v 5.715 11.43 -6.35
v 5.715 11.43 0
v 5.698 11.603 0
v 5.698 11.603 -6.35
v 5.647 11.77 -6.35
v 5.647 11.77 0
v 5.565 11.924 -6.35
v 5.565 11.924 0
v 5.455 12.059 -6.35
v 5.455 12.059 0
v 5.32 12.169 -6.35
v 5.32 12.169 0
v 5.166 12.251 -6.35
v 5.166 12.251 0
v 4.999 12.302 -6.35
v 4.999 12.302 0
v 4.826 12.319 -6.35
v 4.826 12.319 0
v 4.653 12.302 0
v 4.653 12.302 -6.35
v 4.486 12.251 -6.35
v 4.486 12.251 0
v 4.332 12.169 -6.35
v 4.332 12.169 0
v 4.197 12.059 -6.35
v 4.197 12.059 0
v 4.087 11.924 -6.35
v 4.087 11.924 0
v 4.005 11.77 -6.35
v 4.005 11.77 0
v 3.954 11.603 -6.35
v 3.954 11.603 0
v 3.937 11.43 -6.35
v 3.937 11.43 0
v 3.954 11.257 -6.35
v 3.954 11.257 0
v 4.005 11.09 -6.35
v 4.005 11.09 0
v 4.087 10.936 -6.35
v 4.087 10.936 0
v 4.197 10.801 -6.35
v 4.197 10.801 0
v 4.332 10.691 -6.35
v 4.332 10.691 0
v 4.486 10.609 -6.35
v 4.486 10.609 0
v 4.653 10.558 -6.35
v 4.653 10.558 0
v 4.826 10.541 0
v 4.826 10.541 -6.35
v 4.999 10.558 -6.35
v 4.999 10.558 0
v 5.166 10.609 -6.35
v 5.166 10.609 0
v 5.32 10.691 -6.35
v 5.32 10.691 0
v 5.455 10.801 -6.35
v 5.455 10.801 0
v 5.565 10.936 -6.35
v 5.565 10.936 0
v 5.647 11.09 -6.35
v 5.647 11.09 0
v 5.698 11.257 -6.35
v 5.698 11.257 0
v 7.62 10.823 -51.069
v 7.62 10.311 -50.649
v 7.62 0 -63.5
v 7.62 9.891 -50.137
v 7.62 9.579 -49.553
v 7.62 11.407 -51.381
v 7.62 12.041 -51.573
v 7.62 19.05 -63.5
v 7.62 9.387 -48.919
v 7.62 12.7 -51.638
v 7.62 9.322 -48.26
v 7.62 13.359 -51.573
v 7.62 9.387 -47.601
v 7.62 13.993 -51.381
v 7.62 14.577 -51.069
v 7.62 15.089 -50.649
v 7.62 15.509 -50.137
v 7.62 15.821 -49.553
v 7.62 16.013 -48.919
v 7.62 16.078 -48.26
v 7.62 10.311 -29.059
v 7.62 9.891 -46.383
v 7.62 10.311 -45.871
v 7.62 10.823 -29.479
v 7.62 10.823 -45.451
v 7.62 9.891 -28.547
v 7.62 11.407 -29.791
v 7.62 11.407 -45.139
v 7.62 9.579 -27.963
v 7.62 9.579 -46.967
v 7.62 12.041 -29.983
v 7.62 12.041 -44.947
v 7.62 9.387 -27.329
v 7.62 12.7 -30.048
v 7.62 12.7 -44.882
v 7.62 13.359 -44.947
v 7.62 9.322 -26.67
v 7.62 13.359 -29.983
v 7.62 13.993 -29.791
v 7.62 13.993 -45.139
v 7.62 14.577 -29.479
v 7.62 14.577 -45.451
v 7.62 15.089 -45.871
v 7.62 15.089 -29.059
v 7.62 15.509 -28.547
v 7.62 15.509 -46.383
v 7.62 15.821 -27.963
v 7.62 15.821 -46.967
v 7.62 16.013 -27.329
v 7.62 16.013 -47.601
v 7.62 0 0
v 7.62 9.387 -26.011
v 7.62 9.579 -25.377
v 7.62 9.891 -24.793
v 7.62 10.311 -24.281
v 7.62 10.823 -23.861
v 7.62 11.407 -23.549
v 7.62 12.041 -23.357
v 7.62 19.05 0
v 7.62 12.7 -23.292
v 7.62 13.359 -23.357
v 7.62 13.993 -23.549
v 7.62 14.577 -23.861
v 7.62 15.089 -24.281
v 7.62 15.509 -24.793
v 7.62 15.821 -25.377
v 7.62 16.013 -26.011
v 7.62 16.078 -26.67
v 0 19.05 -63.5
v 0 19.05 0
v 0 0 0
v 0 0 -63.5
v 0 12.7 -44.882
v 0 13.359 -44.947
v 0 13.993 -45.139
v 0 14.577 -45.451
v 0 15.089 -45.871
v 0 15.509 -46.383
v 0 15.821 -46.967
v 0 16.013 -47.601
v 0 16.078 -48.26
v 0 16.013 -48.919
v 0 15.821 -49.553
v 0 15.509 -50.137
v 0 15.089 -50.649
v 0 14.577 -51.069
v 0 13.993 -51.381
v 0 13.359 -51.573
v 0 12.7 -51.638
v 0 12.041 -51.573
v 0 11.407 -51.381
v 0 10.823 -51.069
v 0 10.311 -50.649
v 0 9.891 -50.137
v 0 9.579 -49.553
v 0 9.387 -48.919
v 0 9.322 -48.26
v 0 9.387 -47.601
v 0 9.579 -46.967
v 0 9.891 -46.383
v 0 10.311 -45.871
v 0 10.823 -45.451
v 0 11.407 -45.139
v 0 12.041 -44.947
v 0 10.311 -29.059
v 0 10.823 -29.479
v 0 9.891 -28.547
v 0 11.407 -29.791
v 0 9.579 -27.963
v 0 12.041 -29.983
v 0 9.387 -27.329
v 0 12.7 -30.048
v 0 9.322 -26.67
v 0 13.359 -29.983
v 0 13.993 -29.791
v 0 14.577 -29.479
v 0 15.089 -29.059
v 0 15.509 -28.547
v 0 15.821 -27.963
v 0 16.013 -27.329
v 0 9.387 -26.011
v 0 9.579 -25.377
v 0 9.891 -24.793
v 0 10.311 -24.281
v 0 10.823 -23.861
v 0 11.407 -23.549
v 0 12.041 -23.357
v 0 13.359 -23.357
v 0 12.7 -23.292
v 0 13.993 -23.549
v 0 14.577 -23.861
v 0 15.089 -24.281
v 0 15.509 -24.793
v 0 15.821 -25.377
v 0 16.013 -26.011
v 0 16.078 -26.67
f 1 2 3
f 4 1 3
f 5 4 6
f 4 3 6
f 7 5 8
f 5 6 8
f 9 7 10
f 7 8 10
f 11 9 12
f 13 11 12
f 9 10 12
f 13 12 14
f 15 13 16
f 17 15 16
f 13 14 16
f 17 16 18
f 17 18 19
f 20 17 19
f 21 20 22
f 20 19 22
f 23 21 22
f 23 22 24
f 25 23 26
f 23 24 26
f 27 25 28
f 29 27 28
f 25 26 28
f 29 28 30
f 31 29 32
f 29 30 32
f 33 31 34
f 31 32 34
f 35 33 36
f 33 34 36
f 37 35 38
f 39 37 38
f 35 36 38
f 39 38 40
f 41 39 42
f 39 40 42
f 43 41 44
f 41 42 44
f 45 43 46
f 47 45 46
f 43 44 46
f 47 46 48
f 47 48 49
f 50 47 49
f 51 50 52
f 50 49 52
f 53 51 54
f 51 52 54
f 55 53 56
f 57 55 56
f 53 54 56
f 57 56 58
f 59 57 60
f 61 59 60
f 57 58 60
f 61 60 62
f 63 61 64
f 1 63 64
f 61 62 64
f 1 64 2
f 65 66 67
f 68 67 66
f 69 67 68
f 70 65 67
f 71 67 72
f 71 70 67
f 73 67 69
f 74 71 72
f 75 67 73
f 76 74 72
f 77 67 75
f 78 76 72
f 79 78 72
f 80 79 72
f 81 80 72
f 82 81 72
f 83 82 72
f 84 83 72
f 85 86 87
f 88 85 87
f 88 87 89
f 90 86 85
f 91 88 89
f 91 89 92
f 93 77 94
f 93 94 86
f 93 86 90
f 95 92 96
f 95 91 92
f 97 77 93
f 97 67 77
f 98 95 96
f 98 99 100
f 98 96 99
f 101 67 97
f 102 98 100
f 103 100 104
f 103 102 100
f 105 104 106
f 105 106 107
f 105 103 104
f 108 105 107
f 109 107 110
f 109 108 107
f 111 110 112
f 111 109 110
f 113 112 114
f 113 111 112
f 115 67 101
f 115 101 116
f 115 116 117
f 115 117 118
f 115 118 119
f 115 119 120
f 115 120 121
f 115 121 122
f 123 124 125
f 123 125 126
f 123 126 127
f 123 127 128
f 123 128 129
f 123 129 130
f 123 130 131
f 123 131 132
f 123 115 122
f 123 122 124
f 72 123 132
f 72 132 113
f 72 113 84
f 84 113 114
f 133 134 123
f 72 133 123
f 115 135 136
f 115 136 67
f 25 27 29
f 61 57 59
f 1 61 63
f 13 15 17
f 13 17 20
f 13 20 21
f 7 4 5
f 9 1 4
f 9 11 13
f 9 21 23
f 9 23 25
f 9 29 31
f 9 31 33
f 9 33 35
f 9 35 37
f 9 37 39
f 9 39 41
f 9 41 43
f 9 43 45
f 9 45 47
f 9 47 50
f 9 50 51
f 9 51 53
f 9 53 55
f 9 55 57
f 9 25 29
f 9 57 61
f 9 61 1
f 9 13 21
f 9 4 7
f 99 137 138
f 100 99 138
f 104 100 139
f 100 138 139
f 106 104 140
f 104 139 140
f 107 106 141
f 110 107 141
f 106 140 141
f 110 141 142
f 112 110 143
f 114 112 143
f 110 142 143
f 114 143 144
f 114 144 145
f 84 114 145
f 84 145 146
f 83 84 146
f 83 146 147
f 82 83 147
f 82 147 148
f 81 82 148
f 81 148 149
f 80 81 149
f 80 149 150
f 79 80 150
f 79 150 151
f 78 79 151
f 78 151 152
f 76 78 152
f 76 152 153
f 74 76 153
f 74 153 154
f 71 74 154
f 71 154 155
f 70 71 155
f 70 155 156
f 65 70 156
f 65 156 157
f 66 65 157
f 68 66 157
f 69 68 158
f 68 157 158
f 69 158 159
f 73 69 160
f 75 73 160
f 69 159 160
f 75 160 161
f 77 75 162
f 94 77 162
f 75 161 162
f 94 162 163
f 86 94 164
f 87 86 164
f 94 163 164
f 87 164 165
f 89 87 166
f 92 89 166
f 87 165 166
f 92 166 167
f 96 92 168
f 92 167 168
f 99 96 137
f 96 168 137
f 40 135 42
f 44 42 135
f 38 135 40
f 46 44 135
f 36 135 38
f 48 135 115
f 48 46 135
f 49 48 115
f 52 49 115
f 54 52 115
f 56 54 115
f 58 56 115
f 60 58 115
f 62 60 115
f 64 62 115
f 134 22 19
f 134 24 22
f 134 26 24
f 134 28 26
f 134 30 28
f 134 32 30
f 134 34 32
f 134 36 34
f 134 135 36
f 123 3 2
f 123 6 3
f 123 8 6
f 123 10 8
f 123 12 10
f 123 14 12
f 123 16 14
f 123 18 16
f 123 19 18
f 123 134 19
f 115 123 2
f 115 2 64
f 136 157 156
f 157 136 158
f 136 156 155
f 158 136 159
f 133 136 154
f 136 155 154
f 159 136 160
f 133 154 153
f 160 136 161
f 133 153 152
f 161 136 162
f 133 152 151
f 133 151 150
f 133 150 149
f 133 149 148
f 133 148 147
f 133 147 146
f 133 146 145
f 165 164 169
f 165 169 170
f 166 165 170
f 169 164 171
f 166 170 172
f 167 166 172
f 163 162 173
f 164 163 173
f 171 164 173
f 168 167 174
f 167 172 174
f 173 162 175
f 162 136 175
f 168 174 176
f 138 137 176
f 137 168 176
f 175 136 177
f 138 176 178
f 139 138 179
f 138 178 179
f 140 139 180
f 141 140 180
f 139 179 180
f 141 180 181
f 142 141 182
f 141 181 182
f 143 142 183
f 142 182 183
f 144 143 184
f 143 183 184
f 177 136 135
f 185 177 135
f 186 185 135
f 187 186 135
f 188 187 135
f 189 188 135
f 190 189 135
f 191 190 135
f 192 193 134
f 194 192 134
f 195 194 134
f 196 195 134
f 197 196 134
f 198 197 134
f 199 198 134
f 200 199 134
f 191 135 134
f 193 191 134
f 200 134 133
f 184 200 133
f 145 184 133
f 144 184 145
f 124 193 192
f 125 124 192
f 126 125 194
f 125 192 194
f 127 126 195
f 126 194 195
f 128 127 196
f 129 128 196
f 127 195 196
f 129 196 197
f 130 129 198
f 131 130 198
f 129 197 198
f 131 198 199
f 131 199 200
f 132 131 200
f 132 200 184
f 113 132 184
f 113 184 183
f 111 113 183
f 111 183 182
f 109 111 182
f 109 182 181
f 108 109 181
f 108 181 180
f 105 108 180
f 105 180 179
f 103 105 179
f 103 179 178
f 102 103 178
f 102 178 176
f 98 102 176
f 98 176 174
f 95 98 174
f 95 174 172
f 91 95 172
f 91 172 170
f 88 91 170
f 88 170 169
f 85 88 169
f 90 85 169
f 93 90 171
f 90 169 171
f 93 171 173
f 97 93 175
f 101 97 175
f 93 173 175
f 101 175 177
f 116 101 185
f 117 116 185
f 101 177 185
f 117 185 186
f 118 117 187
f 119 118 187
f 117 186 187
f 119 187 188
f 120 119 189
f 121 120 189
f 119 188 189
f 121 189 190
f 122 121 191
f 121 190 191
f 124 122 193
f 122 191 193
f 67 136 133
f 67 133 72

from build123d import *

# Parameters (mm, degrees)
SKETCH1_W           = 7.62
SKETCH1_H           = 19.05
BOSS_EXTRUDE1_DEPTH = 63.5
SKETCH2_R           = 0.889
CUT_EXTRUDE1_DEPTH  = 6.35
SKETCH3_R           = 3.3782
CUT_EXTRUDE2_DEPTH  = 8.62
SKETCH4_R           = 3.3782
CUT_EXTRUDE3_DEPTH  = 8.62


with BuildPart() as part:
    # Sketch1 → Boss-Extrude1 (new body)
    with BuildSketch(Plane.XY):
        with Locations((3.81, 9.525)):
            Rectangle(SKETCH1_W, SKETCH1_H)
    extrude(amount=-BOSS_EXTRUDE1_DEPTH)

    # Sketch2 → Cut-Extrude1 (cut)
    with BuildSketch(Plane.XY):
        with Locations((4.826, 11.43)):
            Circle(SKETCH2_R)
    extrude(amount=-CUT_EXTRUDE1_DEPTH, mode=Mode.SUBTRACT)

    # Sketch3 → Cut-Extrude2 (cut, through all)
    with BuildSketch(Plane.ZY):
        with Locations((-48.26, 12.7)):
            Circle(SKETCH3_R)
    extrude(amount=-CUT_EXTRUDE2_DEPTH, mode=Mode.SUBTRACT)

    # Sketch4 → Cut-Extrude3 (cut, through all)
    with BuildSketch(Plane.ZY):
        with Locations((-26.67, 12.7)):
            Circle(SKETCH4_R)
    extrude(amount=-CUT_EXTRUDE3_DEPTH, mode=Mode.SUBTRACT)


solid = part.part
